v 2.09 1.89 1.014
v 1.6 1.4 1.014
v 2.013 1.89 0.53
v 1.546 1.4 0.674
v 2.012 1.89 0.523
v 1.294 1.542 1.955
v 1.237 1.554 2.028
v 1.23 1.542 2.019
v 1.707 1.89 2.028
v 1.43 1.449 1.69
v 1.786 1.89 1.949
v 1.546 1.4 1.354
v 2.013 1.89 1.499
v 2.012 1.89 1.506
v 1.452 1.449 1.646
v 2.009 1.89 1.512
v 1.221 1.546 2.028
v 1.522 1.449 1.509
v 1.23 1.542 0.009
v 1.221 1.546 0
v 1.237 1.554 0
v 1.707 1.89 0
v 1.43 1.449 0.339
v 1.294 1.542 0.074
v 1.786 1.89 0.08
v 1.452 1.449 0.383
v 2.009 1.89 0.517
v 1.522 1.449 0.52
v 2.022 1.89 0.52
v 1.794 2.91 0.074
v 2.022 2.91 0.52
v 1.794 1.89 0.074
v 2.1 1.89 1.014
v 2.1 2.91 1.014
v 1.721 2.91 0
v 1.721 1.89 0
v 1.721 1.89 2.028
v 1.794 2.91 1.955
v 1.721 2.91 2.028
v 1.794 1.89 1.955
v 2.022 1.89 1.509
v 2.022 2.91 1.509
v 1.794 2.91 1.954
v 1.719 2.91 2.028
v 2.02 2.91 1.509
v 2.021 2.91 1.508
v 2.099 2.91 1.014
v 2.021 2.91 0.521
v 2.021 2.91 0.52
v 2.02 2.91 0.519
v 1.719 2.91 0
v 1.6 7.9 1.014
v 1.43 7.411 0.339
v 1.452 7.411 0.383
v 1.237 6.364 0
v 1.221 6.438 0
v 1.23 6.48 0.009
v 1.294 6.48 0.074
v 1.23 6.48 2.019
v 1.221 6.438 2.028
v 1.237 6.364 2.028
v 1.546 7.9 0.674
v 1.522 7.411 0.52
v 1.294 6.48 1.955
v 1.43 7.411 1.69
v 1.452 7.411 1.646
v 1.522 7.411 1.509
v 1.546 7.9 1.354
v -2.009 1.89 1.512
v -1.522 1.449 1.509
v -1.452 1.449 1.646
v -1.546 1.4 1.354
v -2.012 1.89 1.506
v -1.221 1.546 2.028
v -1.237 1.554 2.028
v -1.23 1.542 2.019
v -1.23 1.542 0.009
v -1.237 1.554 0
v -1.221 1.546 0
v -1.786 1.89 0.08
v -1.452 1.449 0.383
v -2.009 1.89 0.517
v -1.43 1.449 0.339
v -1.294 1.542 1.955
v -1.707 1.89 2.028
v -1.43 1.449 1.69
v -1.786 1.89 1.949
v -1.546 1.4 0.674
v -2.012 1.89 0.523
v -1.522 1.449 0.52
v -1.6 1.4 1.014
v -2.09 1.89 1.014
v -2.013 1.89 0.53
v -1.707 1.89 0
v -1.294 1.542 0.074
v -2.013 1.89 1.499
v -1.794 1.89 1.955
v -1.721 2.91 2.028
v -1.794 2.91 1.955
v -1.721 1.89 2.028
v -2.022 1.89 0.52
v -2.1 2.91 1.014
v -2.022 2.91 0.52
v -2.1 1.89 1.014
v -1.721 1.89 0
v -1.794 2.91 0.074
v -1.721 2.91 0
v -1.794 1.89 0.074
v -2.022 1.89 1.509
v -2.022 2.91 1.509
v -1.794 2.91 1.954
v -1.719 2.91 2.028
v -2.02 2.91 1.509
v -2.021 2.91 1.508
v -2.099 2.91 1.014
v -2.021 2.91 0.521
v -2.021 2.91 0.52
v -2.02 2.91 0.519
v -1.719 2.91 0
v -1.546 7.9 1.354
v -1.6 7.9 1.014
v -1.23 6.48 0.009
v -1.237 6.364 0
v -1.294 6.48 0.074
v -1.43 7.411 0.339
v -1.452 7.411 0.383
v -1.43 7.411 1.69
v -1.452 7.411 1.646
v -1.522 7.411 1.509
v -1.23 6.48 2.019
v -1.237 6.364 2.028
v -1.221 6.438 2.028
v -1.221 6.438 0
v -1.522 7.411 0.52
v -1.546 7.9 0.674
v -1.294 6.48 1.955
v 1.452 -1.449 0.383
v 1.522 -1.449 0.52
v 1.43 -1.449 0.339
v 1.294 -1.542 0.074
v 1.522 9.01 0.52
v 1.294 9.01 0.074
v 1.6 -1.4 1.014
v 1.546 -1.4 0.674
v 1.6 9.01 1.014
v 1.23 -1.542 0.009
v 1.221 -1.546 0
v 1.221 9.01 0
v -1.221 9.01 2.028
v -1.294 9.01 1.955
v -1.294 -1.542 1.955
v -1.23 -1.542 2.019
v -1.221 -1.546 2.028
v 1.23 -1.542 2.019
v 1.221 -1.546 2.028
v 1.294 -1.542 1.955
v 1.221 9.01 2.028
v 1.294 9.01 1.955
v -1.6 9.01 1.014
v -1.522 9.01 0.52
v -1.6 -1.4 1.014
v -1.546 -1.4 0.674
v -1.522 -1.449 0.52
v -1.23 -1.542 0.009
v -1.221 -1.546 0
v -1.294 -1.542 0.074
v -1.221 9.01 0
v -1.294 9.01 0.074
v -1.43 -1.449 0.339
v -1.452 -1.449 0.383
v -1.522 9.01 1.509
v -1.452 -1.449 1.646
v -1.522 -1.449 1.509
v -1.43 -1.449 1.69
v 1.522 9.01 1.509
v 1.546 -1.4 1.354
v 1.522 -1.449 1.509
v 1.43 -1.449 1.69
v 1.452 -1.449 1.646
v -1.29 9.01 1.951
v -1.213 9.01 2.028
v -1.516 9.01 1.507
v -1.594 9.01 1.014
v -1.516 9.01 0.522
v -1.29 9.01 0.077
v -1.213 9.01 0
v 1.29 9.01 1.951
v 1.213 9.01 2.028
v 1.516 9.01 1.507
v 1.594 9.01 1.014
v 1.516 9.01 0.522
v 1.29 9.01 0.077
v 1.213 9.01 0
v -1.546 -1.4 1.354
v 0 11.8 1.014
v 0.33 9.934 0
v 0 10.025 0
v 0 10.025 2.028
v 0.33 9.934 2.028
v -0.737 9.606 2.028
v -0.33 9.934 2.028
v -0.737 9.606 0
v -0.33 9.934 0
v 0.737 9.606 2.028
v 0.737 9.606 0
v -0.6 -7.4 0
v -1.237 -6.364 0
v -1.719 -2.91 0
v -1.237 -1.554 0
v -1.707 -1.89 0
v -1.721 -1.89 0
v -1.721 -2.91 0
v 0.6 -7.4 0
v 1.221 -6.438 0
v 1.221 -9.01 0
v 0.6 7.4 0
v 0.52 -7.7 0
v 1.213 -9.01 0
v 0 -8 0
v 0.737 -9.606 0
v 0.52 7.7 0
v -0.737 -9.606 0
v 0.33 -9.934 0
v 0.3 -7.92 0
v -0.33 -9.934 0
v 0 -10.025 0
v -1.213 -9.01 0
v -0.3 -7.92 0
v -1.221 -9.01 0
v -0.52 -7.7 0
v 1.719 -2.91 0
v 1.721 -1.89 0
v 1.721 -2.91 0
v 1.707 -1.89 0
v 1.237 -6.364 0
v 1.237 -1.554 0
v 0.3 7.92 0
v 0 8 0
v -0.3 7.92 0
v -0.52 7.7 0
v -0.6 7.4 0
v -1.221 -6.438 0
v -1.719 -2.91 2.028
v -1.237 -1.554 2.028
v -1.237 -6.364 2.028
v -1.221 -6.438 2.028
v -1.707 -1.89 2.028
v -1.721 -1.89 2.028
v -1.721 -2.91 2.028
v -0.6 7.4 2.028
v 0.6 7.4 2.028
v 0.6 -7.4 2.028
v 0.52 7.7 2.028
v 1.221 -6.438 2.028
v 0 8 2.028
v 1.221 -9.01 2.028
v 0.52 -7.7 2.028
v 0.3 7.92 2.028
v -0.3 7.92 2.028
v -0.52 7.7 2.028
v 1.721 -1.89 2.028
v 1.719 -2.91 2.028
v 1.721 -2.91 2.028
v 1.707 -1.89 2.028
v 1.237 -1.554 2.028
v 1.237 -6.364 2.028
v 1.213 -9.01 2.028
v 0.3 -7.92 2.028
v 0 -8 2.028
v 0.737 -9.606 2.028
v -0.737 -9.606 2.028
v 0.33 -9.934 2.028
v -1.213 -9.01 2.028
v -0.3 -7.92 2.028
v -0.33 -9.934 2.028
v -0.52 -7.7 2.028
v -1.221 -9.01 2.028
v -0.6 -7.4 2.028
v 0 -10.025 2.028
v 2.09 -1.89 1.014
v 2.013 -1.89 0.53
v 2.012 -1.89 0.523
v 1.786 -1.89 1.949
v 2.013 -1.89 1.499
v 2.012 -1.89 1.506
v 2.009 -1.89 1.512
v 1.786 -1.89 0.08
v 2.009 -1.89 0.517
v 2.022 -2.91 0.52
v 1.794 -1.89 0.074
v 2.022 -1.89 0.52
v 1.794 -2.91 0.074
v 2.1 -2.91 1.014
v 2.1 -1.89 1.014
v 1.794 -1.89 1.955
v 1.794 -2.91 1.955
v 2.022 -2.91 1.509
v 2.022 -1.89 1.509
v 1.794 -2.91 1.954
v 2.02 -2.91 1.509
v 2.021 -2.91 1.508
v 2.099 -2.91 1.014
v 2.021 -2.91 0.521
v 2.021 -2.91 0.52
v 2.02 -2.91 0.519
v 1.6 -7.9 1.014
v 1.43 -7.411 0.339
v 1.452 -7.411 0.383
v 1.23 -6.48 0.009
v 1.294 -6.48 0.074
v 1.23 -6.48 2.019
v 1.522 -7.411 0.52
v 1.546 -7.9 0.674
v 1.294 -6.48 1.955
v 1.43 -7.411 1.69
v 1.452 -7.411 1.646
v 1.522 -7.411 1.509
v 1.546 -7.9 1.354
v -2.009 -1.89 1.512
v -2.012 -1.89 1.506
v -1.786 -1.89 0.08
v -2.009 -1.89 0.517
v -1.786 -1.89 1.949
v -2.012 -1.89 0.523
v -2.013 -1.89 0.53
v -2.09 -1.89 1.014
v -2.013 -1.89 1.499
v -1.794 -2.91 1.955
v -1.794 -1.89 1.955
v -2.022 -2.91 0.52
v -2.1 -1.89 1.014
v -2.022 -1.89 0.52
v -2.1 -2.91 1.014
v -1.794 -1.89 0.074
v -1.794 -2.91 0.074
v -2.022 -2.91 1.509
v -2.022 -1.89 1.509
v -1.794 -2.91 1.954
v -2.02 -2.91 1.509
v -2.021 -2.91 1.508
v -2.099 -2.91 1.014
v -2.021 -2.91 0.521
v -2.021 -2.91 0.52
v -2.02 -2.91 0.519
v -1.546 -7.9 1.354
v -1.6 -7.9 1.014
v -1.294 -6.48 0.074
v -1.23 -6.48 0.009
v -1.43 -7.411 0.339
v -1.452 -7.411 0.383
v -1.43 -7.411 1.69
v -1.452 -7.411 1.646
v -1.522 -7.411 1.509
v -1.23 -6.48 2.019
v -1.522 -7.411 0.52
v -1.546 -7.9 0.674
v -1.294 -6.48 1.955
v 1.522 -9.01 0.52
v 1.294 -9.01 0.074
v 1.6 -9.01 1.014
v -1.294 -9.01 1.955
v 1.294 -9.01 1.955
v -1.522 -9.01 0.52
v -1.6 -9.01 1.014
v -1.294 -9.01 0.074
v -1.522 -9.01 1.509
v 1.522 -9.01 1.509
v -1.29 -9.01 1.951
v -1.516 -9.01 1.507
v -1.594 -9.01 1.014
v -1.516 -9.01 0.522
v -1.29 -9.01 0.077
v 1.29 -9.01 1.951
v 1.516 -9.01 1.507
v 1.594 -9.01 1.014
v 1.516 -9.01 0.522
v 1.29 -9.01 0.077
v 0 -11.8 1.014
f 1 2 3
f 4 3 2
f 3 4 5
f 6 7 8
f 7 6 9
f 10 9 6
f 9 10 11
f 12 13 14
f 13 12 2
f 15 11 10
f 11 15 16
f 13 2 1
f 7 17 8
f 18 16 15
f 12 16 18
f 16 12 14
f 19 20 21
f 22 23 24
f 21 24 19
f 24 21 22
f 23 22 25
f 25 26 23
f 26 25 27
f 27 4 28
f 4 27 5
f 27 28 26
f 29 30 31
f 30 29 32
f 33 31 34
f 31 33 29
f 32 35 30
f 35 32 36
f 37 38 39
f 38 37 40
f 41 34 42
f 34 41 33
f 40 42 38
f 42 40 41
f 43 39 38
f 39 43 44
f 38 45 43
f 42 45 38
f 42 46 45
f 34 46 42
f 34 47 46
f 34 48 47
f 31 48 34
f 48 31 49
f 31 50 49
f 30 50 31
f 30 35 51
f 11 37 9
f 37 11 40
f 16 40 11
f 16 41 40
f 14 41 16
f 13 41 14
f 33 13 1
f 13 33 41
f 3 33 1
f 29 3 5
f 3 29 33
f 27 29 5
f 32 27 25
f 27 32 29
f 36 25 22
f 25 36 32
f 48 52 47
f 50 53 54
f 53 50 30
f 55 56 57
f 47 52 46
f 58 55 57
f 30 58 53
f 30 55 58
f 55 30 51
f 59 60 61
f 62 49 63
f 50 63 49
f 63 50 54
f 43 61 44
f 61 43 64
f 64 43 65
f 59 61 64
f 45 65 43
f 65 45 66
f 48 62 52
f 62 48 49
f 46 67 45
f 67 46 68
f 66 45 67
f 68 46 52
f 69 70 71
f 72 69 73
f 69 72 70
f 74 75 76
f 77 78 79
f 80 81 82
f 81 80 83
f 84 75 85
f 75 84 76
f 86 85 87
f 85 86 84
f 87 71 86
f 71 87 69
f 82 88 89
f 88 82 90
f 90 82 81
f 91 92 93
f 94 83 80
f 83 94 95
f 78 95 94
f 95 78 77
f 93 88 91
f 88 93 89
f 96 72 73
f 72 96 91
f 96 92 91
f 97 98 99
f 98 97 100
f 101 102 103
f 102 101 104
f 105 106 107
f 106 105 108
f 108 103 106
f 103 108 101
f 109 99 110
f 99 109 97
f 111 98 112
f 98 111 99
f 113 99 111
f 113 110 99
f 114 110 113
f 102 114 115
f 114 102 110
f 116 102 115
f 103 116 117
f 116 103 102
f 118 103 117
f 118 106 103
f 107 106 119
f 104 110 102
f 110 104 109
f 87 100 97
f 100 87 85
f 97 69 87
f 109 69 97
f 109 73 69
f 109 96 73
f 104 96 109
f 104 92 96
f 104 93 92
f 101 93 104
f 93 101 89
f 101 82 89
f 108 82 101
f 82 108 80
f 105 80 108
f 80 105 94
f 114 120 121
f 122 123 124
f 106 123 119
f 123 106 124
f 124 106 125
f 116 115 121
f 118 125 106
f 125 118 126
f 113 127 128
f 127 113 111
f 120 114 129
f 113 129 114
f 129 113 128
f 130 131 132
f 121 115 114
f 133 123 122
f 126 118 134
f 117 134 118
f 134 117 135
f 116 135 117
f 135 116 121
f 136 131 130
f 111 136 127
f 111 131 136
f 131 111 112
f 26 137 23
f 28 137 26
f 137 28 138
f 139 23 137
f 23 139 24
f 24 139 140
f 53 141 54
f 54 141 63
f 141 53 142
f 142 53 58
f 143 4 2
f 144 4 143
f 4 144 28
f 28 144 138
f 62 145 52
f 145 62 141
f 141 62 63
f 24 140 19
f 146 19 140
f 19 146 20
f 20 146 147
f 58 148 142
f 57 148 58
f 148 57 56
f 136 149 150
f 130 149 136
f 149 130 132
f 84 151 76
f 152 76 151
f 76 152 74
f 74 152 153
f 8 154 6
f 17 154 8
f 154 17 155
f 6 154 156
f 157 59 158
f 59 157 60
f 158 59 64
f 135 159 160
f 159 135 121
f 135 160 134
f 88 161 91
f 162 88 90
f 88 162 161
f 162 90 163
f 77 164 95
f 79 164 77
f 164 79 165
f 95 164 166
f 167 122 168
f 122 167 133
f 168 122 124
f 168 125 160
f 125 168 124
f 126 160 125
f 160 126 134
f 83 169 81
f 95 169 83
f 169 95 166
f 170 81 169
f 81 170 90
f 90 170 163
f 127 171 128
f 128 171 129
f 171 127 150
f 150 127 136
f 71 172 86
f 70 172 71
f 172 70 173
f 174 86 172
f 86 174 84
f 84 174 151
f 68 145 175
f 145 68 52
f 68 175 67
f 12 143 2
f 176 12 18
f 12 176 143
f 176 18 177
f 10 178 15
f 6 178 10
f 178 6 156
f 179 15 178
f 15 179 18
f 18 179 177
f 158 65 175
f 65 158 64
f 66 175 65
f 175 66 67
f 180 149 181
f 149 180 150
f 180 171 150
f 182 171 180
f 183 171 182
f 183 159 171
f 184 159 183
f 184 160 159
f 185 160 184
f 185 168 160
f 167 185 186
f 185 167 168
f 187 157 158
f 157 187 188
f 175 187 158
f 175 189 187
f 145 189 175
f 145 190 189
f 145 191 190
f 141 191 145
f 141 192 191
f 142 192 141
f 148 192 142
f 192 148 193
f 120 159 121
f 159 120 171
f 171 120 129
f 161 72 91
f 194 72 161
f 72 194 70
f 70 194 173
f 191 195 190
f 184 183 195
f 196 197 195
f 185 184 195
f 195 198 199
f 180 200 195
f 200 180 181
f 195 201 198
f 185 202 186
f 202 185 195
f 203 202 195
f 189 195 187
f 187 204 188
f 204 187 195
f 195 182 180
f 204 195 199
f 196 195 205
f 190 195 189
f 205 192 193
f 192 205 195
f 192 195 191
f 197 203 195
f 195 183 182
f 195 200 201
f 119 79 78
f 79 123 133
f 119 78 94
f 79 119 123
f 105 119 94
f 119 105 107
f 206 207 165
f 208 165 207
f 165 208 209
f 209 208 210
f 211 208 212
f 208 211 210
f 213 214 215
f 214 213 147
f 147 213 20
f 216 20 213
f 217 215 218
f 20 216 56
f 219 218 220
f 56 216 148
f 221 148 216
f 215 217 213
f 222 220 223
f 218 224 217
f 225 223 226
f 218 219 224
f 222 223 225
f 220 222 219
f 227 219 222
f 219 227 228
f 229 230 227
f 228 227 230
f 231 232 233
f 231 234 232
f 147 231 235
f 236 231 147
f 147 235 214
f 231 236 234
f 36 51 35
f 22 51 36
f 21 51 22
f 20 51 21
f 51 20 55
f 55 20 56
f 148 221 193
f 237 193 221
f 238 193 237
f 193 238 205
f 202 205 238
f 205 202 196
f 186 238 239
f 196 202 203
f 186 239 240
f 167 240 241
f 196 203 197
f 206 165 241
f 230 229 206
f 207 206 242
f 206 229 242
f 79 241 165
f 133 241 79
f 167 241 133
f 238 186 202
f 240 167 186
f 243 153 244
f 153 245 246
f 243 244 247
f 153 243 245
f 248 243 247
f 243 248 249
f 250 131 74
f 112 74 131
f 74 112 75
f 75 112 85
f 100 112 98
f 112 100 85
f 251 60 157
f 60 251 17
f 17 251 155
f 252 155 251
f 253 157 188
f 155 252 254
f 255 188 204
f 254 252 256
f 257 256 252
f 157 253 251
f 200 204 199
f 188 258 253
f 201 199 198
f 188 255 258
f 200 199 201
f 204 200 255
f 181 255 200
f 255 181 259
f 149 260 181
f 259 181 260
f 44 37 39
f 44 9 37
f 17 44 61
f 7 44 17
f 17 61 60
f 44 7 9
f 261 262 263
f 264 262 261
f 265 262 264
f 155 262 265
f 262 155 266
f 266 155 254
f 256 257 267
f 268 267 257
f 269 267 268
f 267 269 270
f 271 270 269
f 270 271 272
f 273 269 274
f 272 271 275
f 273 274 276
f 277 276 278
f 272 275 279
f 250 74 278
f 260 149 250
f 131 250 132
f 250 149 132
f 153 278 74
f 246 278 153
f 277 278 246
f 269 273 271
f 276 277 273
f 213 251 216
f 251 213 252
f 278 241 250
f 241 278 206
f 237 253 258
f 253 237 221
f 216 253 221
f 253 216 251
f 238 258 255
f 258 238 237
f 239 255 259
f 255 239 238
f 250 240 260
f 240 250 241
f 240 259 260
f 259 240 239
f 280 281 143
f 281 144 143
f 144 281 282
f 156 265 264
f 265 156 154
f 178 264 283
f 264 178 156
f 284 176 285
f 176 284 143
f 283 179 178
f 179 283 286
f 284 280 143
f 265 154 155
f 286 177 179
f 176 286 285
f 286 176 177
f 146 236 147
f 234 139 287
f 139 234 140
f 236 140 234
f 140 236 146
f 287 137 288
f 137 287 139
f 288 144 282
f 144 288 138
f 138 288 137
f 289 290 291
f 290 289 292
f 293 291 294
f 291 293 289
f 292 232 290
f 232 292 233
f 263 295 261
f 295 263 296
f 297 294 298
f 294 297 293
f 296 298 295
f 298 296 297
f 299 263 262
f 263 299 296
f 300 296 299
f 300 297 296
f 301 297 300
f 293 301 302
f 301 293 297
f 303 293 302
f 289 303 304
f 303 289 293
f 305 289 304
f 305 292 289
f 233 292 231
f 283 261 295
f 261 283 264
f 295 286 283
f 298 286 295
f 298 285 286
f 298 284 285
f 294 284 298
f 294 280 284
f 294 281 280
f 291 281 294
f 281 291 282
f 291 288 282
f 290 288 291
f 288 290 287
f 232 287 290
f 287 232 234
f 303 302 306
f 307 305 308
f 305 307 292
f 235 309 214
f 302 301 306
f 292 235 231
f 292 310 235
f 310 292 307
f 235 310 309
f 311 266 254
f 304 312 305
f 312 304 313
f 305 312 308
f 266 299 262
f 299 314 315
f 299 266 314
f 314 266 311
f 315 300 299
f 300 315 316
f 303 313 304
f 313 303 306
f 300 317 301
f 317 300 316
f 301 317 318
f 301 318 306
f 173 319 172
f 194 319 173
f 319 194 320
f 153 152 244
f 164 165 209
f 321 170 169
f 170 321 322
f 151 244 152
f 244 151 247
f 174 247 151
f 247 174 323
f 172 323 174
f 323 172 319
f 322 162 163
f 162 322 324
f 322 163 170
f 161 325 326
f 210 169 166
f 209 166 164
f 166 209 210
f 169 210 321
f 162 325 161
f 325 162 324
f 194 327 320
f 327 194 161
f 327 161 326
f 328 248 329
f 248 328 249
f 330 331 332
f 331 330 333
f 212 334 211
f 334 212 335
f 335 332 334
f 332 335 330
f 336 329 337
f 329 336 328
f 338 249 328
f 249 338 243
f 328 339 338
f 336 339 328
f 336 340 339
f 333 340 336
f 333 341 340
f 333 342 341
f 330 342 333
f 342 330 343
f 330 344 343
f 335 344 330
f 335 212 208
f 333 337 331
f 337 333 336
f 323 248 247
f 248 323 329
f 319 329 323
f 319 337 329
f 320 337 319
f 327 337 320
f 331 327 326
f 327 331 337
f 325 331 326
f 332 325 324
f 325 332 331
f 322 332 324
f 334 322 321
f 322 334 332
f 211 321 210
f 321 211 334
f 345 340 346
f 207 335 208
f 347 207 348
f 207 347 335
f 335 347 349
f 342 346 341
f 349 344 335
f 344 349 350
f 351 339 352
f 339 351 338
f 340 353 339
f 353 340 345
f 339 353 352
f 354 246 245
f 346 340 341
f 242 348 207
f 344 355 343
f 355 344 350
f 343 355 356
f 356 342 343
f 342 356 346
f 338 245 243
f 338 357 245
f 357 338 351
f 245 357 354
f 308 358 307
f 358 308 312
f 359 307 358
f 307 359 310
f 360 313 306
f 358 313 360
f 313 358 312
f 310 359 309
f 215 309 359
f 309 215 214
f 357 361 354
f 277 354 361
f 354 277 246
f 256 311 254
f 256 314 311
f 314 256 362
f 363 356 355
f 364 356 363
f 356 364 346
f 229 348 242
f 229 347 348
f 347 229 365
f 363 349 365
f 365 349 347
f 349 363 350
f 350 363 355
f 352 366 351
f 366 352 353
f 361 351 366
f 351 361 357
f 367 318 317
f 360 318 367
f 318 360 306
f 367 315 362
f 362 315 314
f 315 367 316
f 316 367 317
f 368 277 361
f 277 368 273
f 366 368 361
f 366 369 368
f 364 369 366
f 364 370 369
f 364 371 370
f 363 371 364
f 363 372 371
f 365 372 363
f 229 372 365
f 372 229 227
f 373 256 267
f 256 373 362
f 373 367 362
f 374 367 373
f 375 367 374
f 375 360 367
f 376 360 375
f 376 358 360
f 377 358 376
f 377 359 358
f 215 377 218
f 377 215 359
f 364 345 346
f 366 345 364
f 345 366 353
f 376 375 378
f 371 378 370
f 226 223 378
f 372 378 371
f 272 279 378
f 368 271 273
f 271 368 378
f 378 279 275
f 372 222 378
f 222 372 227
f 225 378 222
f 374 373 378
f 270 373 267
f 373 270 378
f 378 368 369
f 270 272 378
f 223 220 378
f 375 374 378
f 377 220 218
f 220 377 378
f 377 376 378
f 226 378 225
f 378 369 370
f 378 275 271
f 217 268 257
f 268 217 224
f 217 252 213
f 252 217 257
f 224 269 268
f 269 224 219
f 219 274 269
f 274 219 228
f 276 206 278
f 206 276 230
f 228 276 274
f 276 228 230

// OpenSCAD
// new pin connectors

object=0;//[0:Pinpeg,1:Pinhole]
//Pinpeg is twice this length
length=12;
//Of hole; pinpeg is smaller to fit
diameter=4;
//Only affects pinhole
hole_twist=0;//[0:free,1:fixed]
//Pulls the snaps together on the pinpeg to ensure a tight coupling
preload=0.1;
//Allows pins to fit easily into holes
clearance=0.4;
//Thicker makes the pinpeg stiffer
thickness=1;
//Height of snap nubs
snap=0.1;
//Put fins on pinhole to help with printing strength
fins=1;//[1:yes,0:no]

$fn=20;

if(object==0)pinpeg(r=diameter/2,l=length,d=2.5-preload,nub=snap,t=thickness,space=clearance);
if(object==1)pinhole(r=diameter/2,l=length,nub=snap,fixed=hole_twist,fins=fins);

// pin(flat=0);
// %pinhole(fixed=true);

//pinpeg();
//translate([10,0,0])difference(){
//	cylinder(r=5.5,h=14);
//	pinhole(fixed=true);
//}
//translate([-10,0,0])difference(){
//	cylinder(r=5.5,h=14);
//	pinhole(fixed=false);
//}

module pin(r=3.5,l=13,d=2.4,slot=10,nub=0.4,t=1.8,space=0.3,flat=1)
translate(flat*[0,0,r/sqrt(2)-space])rotate((1-flat)*[90,0,0])
difference(){
	rotate([-90,0,0])intersection(){
		union(){
			translate([0,0,-0.01])cylinder(r=r-space,h=l-r-0.98);
			translate([0,0,l-r-1])cylinder(r1=r-space,r2=0,h=r-space/2+1);
			translate([nub+space,0,d])nub(r-space,nub+space);
			translate([-nub-space,0,d])nub(r-space,nub+space);
		}
		cube([3*r,r*sqrt(2)-2*space,2*l+3*r],center=true);
	}
	translate([0,d,0])cube([2*(r-t-space),slot,2*r],center=true);
	translate([0,d-slot/2,0])cylinder(r=r-t-space,h=2*r,center=true,$fn=12);
	translate([0,d+slot/2,0])cylinder(r=r-t-space,h=2*r,center=true,$fn=12);
}

module nub(r,nub)
union(){
	translate([0,0,-nub-0.5])cylinder(r1=r-nub,r2=r,h=nub);
	cylinder(r=r,h=1.02,center=true);
	translate([0,0,0.5])cylinder(r1=r,r2=r-nub,h=5);
}

module pinhole(r=3.5,l=13,d=2.5,nub=0.4,fixed=false,fins=true)
intersection(){
	union(){
		translate([0,0,-0.1])cylinder(r=r,h=l-r+0.1);
		translate([0,0,l-r-0.01])cylinder(r1=r,r2=0,h=r);
		translate([0,0,d])nub(r+nub,nub);
		if(fins)translate([0,0,l-r]){
			cube([2*r,0.01,2*r],center=true);
			cube([0.01,2*r,2*r],center=true);
		}
	}
	if(fixed)cube([3*r,r*sqrt(2),2*l+3*r],center=true);
}

module pinpeg(r=3.5,l=13,d=2.4,nub=0.4,t=1.8,space=0.3)
union(){
	pin(r=r,l=l,d=d,nub=nub,t=t,space=space,flat=1);
	mirror([0,1,0])pin(r=r,l=l,d=d,nub=nub,t=t,space=space,flat=1);
}
